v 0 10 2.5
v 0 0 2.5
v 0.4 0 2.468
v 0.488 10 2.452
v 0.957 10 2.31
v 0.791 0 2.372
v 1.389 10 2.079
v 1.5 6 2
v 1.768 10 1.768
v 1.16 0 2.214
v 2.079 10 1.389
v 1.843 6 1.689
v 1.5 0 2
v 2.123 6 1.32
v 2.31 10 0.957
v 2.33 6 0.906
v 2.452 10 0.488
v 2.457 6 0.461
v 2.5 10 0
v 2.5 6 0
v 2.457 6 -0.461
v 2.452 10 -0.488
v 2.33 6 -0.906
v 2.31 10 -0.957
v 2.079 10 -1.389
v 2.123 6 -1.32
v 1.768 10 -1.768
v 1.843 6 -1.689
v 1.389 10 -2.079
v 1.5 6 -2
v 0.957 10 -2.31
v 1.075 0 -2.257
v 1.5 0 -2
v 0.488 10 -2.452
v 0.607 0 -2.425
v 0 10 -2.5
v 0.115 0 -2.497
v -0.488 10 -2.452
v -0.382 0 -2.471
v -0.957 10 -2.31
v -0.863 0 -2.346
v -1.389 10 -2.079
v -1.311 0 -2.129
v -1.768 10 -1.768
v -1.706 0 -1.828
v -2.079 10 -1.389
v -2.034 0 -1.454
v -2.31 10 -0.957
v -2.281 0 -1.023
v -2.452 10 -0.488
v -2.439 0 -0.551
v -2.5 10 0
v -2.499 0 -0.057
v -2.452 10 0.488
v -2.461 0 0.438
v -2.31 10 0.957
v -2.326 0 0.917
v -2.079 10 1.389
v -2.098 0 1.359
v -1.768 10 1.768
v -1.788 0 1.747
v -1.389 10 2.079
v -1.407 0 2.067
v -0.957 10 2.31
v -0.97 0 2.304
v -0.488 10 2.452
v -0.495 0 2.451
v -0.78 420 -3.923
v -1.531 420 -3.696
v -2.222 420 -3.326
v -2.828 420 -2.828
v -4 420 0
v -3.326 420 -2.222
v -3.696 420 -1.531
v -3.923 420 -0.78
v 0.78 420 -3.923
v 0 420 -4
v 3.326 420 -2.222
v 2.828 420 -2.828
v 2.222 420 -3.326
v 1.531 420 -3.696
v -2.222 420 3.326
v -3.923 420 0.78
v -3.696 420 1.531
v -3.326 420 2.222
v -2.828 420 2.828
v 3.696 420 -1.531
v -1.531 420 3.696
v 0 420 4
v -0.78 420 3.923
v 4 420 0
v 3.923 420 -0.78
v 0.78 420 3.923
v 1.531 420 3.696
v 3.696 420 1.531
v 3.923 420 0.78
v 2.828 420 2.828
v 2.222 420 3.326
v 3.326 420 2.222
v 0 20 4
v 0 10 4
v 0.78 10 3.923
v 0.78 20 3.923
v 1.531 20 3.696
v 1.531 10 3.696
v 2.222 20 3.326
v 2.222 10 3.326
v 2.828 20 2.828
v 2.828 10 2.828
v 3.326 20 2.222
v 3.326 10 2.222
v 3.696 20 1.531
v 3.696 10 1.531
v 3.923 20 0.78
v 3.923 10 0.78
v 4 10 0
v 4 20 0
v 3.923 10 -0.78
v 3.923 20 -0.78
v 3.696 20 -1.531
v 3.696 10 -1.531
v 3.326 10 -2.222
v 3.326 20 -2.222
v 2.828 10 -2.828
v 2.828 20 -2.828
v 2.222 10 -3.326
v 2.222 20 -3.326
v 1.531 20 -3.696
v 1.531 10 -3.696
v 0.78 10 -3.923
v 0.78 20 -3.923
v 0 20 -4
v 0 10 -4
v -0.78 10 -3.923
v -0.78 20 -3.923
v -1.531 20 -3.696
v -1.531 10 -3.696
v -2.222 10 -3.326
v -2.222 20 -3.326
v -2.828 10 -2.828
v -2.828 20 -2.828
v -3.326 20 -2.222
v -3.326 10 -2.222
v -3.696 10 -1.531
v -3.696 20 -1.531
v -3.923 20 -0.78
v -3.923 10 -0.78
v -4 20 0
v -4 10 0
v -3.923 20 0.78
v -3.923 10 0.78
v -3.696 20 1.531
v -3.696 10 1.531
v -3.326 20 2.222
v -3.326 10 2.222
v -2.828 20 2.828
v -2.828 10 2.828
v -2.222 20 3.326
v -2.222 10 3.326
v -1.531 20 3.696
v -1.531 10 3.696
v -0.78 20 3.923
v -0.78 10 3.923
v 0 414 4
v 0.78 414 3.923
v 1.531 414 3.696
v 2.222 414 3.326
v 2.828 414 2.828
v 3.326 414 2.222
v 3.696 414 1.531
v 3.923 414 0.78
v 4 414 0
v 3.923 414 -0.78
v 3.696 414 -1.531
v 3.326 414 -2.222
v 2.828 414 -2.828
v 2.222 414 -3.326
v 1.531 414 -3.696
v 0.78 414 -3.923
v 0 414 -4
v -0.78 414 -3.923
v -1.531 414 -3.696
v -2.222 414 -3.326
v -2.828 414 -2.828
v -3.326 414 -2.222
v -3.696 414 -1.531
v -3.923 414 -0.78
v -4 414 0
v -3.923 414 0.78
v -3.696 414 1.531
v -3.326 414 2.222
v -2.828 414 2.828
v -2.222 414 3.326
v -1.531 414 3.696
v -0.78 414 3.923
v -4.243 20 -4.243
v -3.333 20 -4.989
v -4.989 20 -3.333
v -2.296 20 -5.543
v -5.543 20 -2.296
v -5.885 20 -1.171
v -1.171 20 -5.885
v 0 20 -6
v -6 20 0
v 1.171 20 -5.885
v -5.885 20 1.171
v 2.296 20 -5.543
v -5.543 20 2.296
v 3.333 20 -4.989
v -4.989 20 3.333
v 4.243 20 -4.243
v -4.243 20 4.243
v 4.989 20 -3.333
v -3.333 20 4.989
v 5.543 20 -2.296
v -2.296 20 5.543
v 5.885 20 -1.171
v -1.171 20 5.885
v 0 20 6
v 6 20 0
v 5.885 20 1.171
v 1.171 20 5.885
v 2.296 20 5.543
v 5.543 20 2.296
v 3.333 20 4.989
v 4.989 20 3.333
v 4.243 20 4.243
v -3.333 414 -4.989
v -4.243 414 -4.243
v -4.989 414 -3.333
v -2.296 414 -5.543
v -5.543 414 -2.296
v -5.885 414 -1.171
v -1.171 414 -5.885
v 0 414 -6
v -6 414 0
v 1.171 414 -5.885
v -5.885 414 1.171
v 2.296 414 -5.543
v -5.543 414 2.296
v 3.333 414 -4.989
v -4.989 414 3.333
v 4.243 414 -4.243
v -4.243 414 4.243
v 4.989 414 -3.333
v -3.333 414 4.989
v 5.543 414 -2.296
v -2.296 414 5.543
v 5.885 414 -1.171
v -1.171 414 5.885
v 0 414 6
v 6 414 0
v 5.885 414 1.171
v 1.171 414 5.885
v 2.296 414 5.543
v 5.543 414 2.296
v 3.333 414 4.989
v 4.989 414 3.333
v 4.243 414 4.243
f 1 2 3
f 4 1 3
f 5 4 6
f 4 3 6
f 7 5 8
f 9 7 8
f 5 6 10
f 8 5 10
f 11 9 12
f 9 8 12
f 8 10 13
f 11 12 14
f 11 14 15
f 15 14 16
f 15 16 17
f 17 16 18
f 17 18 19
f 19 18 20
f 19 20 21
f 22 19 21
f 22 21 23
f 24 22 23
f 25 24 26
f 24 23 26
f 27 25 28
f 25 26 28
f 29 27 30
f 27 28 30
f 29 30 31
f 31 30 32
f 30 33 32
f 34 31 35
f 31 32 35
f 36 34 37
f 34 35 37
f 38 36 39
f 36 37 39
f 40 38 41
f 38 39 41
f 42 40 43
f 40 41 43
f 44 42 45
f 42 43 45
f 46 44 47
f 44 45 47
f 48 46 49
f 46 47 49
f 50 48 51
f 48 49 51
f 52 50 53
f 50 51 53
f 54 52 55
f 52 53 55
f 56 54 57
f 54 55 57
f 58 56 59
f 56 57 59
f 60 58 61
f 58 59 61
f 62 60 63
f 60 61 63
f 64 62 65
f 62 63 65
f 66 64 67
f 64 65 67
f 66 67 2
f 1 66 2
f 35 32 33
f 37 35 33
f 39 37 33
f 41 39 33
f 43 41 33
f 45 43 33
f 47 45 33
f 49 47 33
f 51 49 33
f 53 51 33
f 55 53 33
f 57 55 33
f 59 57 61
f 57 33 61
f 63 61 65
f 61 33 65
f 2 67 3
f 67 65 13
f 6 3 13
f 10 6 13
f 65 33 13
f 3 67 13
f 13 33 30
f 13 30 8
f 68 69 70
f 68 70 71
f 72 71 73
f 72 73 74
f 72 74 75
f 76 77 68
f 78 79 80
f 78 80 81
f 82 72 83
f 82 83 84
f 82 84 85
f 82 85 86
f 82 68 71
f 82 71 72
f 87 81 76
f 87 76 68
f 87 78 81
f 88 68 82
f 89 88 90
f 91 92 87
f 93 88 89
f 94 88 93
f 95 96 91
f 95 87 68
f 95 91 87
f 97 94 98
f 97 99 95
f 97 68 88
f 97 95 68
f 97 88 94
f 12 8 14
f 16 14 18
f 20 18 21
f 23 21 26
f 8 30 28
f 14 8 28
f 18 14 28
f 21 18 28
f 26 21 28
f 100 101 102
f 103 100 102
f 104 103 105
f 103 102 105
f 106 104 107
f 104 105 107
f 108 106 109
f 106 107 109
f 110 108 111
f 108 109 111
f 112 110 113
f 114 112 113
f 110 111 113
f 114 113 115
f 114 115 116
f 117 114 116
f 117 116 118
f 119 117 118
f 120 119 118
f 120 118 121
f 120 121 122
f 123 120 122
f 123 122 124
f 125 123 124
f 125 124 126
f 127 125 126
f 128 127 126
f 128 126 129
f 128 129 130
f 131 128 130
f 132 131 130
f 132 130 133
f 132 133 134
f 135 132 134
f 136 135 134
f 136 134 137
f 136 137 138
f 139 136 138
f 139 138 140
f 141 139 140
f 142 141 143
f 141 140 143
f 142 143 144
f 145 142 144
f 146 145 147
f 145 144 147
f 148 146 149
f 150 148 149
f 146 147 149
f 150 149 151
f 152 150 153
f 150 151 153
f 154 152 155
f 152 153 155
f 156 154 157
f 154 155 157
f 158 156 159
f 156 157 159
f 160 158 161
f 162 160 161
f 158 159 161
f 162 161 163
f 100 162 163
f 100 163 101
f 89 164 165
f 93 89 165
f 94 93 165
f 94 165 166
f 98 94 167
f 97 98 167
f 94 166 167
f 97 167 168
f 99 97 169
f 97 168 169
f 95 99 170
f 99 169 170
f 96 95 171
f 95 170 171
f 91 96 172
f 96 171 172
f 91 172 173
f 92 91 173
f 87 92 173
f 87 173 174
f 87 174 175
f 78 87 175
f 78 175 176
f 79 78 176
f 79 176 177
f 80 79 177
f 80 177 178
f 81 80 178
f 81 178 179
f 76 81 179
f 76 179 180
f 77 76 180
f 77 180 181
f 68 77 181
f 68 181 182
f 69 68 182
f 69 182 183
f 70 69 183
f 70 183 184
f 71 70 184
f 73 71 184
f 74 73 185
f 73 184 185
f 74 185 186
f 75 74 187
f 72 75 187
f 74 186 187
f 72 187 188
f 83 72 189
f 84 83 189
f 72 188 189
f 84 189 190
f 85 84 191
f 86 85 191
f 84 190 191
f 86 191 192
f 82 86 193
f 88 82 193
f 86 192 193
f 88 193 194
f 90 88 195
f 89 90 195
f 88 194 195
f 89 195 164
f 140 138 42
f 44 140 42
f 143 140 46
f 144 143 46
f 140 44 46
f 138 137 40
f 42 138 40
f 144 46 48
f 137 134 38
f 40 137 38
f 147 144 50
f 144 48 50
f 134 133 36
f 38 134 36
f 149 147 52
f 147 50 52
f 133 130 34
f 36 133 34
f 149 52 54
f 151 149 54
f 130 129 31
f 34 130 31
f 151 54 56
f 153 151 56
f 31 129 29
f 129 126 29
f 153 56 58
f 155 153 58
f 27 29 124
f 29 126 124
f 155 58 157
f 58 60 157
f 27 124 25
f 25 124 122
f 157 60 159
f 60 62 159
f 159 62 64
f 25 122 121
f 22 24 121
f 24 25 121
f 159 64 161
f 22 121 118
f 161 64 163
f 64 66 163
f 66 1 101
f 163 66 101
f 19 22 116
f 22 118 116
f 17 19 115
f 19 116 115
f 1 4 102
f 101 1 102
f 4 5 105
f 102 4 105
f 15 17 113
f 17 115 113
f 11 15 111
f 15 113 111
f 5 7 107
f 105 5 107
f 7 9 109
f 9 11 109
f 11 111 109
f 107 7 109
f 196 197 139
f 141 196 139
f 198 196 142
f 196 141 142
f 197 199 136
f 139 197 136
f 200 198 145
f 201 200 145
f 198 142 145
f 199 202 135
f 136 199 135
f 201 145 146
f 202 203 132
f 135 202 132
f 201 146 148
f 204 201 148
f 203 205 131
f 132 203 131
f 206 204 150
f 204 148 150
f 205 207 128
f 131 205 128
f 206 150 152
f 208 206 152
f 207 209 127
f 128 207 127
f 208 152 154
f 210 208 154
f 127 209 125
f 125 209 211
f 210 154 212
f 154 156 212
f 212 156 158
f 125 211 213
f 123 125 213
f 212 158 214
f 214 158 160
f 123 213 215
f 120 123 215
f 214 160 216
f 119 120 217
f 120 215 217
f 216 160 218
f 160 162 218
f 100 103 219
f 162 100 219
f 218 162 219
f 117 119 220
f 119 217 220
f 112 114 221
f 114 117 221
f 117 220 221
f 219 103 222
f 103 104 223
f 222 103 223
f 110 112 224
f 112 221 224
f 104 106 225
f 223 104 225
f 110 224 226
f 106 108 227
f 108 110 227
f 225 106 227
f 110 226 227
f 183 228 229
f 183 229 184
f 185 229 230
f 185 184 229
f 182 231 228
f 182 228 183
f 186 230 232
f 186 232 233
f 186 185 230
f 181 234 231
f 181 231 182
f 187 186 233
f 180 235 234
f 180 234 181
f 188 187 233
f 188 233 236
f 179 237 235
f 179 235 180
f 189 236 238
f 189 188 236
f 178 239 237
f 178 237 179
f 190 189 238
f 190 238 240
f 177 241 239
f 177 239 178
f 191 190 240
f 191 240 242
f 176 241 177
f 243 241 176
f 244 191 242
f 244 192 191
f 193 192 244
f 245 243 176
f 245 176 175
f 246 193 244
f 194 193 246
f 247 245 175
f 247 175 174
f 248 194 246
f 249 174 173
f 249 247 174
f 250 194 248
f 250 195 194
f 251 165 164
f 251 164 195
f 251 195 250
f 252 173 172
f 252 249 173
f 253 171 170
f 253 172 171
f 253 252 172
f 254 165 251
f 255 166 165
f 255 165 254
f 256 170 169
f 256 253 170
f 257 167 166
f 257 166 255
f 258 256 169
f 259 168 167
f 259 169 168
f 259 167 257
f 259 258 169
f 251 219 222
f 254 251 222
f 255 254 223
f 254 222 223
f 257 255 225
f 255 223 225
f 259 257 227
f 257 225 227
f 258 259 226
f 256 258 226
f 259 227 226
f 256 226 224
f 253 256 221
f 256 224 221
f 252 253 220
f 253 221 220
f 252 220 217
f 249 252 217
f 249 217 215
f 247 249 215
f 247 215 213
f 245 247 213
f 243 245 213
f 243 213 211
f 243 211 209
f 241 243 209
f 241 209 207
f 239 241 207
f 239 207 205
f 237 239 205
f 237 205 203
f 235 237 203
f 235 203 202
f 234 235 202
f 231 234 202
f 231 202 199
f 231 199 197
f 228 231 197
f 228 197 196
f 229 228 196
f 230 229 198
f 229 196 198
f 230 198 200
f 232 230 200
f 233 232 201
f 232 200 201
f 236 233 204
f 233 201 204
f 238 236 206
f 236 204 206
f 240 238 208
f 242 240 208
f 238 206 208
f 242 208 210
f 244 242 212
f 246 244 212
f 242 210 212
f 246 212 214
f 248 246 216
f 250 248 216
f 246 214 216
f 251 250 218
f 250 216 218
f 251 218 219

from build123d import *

# Parameters (mm, degrees)
SKETCH1_R           = 4
BOSS_EXTRUDE1_DEPTH = 420
SKETCH1_3_R         = 6
SKETCH1_3_R_2       = 4
BOSS_EXTRUDE2_DEPTH = 414
SKETCH1_4_R         = 6
SKETCH1_4_R_2       = 4
CUT_EXTRUDE1_DEPTH  = 20
SKETCH1_5_R         = 4
CUT_EXTRUDE2_DEPTH  = 10
CUT_EXTRUDE3_DEPTH  = 6


with BuildPart() as part:
    # Sketch1 → Boss-Extrude1 (new body)
    with BuildSketch(Plane(origin=(0, 0, 0), x_dir=(1, 0, 0), z_dir=(0, 1, 0))):
        Circle(SKETCH1_R)
    extrude(amount=BOSS_EXTRUDE1_DEPTH)

    # Sketch1<3> → Boss-Extrude2 (add)
    with BuildSketch(Plane(origin=(0, 0, 0), x_dir=(1, 0, 0), z_dir=(0, 1, 0))):
        Circle(SKETCH1_3_R)
        Circle(SKETCH1_3_R_2, mode=Mode.SUBTRACT)
    extrude(amount=BOSS_EXTRUDE2_DEPTH)

    # Sketch1<4> → Cut-Extrude1 (cut)
    with BuildSketch(Plane(origin=(0, 0, 0), x_dir=(1, 0, 0), z_dir=(0, 1, 0))):
        Circle(SKETCH1_4_R)
        Circle(SKETCH1_4_R_2, mode=Mode.SUBTRACT)
    extrude(amount=CUT_EXTRUDE1_DEPTH, mode=Mode.SUBTRACT)

    # Sketch1<5> → Cut-Extrude2 (cut)
    with BuildSketch(Plane(origin=(0, 0, 0), x_dir=(1, 0, 0), z_dir=(0, 1, 0))):
        Circle(SKETCH1_5_R)
        with BuildLine():
            ThreePointArc((1.5, -2), (-2.5, 0), (1.5, 2))
            ThreePointArc((1.5, 2), (2.236067977, 1.118033989), (2.5, 0))
            ThreePointArc((2.5, 0), (2.236067977, -1.118033989), (1.5, -2))
        make_face(mode=Mode.SUBTRACT)
    extrude(amount=CUT_EXTRUDE2_DEPTH, mode=Mode.SUBTRACT)

    # Sketch1<6> → Cut-Extrude3 (cut)
    with BuildSketch(Plane(origin=(0, 0, 0), x_dir=(1, 0, 0), z_dir=(0, 1, 0))):
        with BuildLine():
            ThreePointArc((2.5, 0), (2.236067977, 1.118033989), (1.5, 2))
            Line((1.5, 2), (1.5, -2))
            ThreePointArc((1.5, -2), (2.236067977, -1.118033989), (2.5, 0))
        make_face()
    extrude(amount=CUT_EXTRUDE3_DEPTH, mode=Mode.SUBTRACT)


solid = part.part
